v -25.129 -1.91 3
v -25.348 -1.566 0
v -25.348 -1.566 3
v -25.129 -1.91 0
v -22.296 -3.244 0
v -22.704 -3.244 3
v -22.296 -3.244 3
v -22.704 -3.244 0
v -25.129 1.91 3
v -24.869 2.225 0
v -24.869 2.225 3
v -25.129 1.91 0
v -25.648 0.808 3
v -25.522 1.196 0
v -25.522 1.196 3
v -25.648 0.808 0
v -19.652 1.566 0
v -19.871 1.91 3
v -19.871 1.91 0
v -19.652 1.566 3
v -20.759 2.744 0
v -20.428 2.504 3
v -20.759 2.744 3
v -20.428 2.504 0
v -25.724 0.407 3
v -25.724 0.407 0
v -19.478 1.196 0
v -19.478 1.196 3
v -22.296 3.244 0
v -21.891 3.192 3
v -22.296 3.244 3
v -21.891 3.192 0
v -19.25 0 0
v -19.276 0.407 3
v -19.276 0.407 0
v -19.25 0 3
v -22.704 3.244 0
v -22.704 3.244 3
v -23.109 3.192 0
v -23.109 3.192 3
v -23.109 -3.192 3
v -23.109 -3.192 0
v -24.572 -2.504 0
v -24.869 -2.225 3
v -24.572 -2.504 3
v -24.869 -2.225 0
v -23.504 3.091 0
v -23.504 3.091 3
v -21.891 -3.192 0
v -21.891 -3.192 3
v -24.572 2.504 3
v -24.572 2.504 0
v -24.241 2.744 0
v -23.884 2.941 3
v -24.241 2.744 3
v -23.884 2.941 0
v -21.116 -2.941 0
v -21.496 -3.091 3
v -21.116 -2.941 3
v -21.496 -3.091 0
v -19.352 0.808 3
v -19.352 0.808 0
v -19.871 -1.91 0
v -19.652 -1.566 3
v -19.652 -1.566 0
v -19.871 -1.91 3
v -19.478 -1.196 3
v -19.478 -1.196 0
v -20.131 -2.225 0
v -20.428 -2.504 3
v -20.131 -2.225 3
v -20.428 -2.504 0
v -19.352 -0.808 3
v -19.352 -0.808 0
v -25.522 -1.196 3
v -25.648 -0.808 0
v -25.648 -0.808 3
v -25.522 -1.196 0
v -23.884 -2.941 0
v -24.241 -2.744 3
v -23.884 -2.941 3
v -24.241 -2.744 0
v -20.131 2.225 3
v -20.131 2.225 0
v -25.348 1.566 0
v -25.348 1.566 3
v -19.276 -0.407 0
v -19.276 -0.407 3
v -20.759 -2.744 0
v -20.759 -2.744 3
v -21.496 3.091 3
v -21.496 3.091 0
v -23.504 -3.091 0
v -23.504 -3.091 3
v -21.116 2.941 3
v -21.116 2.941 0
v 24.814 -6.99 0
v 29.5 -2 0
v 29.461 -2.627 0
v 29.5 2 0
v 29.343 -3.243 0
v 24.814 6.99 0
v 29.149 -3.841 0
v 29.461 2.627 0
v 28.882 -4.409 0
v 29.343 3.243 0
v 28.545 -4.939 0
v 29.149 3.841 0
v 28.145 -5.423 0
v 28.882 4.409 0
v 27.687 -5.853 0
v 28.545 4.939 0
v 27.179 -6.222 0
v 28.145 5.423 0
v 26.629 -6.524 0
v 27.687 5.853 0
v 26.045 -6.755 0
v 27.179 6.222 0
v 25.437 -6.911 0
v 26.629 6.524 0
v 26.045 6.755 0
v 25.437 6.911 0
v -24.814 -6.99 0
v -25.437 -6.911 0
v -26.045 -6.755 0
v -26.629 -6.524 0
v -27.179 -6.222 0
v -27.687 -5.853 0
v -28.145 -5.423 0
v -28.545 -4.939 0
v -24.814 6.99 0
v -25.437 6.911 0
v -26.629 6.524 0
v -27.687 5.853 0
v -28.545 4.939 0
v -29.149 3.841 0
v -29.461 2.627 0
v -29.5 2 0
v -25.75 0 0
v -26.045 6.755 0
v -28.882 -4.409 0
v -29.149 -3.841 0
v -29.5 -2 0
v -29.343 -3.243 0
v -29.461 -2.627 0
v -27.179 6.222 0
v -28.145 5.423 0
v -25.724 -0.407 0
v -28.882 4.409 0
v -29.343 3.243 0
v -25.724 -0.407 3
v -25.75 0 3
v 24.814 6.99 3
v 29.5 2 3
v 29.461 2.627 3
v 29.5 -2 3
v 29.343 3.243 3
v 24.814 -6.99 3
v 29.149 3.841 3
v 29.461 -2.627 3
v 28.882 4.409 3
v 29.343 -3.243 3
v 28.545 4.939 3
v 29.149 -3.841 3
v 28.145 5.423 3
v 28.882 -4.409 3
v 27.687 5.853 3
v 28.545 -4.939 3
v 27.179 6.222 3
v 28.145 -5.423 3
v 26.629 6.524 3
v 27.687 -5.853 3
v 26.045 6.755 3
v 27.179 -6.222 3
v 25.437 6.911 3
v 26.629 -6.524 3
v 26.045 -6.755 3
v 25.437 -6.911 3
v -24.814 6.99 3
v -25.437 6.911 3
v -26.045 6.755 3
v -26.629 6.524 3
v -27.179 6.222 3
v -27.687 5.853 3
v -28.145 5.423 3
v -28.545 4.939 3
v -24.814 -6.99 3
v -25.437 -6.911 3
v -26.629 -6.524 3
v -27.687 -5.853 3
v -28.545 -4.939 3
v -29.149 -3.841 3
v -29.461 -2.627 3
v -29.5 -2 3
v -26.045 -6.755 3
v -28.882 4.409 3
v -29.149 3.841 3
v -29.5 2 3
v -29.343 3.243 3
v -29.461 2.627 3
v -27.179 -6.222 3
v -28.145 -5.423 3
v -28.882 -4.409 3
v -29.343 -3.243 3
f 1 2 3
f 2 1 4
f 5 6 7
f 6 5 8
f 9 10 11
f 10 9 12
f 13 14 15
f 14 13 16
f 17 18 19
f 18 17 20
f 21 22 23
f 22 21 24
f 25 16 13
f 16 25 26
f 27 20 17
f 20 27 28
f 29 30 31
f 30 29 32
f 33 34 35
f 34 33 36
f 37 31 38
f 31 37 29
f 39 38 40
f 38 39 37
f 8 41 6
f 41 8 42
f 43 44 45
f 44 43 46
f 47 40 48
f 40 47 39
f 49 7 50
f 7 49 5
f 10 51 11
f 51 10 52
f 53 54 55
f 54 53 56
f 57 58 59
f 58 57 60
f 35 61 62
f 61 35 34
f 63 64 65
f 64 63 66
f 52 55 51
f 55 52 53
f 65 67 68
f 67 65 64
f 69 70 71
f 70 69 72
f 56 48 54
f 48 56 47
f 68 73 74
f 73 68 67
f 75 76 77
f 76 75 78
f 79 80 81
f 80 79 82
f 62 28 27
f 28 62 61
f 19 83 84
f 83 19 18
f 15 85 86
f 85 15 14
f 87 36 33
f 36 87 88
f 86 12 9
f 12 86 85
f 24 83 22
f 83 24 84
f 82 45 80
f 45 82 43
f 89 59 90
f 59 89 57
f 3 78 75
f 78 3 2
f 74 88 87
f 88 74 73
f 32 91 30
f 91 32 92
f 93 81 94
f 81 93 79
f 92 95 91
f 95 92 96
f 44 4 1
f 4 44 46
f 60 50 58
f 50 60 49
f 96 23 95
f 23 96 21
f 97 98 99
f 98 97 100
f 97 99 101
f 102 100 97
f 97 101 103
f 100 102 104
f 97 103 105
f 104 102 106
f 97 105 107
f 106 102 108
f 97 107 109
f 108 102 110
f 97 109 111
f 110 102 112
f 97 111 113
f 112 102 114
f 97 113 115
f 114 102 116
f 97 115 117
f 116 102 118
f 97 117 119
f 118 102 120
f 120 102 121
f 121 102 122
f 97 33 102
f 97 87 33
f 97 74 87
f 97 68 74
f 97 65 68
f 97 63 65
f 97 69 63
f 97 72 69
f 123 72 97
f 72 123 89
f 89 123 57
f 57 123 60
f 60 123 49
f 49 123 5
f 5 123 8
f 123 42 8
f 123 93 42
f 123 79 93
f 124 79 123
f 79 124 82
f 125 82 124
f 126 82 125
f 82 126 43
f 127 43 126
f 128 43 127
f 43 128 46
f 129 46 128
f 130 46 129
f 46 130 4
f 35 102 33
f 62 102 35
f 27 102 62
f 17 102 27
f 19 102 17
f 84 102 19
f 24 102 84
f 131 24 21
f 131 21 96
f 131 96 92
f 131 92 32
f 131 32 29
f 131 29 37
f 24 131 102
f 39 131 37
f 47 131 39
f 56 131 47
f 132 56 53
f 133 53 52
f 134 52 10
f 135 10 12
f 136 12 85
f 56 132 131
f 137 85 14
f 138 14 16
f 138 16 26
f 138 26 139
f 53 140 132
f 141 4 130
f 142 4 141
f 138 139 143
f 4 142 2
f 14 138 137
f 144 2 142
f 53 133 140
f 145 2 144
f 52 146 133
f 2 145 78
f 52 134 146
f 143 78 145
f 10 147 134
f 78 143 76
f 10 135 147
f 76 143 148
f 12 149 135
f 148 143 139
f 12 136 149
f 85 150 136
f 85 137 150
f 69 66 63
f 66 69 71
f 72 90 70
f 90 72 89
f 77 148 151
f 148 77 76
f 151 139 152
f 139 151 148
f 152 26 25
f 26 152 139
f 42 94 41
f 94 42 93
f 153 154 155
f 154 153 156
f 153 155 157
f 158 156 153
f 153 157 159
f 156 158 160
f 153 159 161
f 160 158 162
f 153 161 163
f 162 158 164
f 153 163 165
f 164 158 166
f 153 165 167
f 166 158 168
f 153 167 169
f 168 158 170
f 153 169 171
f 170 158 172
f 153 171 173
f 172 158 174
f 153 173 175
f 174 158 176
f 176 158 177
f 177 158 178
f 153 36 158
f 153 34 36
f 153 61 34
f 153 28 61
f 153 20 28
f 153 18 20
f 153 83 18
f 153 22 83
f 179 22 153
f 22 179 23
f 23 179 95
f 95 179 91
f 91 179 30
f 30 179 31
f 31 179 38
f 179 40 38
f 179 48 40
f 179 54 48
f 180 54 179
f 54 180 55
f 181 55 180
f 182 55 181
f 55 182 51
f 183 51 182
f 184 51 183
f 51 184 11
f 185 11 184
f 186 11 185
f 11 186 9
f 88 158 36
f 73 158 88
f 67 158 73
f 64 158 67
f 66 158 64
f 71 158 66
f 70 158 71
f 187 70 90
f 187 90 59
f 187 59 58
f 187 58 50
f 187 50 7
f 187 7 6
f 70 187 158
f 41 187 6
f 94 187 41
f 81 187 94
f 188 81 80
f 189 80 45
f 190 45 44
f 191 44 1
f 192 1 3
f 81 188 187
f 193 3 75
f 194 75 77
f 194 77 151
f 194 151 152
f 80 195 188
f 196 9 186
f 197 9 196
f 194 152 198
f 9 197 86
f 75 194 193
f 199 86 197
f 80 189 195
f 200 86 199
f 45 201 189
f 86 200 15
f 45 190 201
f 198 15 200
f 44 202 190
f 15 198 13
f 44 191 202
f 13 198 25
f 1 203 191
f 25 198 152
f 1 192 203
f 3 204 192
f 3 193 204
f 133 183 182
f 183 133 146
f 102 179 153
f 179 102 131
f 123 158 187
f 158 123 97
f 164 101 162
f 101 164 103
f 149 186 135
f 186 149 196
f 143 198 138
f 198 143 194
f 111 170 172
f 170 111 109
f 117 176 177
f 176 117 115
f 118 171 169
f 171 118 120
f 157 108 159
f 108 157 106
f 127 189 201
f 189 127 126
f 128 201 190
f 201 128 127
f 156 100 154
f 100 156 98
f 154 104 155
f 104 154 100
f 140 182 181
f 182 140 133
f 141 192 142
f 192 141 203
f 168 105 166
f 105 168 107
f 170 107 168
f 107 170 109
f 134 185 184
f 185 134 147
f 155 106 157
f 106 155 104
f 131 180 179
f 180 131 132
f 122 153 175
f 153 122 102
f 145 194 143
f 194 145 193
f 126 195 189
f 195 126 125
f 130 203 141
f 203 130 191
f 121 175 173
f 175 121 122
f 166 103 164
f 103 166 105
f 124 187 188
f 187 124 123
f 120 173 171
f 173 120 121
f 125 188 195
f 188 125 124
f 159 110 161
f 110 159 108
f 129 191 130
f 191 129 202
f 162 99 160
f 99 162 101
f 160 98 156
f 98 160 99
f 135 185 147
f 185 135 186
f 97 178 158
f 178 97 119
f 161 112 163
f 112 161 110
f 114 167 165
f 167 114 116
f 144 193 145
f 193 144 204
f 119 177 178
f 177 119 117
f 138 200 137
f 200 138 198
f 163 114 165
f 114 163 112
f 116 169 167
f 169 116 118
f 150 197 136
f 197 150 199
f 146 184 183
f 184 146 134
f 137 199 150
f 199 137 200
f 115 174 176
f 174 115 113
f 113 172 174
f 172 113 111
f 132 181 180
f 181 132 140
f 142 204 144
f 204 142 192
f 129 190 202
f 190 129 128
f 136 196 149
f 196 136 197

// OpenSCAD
$fn = 50;


difference() {
	union() {
		hull() {
			translate(v = [-24.5000000000, 2.0000000000, 0]) {
				cylinder(h = 3, r = 5);
			}
			translate(v = [24.5000000000, 2.0000000000, 0]) {
				cylinder(h = 3, r = 5);
			}
			translate(v = [-24.5000000000, -2.0000000000, 0]) {
				cylinder(h = 3, r = 5);
			}
			translate(v = [24.5000000000, -2.0000000000, 0]) {
				cylinder(h = 3, r = 5);
			}
		}
	}
	union() {
		translate(v = [-22.5000000000, 0.0000000000, 0]) {
			cylinder(h = 3, r = 3.2500000000);
		}
		translate(v = [-22.5000000000, 0.0000000000, 0]) {
			cylinder(h = 3, r = 1.8000000000);
		}
		translate(v = [-22.5000000000, 0.0000000000, 0]) {
			cylinder(h = 3, r = 1.8000000000);
		}
		translate(v = [-22.5000000000, 0.0000000000, 0]) {
			cylinder(h = 3, r = 1.8000000000);
		}
	}
}
